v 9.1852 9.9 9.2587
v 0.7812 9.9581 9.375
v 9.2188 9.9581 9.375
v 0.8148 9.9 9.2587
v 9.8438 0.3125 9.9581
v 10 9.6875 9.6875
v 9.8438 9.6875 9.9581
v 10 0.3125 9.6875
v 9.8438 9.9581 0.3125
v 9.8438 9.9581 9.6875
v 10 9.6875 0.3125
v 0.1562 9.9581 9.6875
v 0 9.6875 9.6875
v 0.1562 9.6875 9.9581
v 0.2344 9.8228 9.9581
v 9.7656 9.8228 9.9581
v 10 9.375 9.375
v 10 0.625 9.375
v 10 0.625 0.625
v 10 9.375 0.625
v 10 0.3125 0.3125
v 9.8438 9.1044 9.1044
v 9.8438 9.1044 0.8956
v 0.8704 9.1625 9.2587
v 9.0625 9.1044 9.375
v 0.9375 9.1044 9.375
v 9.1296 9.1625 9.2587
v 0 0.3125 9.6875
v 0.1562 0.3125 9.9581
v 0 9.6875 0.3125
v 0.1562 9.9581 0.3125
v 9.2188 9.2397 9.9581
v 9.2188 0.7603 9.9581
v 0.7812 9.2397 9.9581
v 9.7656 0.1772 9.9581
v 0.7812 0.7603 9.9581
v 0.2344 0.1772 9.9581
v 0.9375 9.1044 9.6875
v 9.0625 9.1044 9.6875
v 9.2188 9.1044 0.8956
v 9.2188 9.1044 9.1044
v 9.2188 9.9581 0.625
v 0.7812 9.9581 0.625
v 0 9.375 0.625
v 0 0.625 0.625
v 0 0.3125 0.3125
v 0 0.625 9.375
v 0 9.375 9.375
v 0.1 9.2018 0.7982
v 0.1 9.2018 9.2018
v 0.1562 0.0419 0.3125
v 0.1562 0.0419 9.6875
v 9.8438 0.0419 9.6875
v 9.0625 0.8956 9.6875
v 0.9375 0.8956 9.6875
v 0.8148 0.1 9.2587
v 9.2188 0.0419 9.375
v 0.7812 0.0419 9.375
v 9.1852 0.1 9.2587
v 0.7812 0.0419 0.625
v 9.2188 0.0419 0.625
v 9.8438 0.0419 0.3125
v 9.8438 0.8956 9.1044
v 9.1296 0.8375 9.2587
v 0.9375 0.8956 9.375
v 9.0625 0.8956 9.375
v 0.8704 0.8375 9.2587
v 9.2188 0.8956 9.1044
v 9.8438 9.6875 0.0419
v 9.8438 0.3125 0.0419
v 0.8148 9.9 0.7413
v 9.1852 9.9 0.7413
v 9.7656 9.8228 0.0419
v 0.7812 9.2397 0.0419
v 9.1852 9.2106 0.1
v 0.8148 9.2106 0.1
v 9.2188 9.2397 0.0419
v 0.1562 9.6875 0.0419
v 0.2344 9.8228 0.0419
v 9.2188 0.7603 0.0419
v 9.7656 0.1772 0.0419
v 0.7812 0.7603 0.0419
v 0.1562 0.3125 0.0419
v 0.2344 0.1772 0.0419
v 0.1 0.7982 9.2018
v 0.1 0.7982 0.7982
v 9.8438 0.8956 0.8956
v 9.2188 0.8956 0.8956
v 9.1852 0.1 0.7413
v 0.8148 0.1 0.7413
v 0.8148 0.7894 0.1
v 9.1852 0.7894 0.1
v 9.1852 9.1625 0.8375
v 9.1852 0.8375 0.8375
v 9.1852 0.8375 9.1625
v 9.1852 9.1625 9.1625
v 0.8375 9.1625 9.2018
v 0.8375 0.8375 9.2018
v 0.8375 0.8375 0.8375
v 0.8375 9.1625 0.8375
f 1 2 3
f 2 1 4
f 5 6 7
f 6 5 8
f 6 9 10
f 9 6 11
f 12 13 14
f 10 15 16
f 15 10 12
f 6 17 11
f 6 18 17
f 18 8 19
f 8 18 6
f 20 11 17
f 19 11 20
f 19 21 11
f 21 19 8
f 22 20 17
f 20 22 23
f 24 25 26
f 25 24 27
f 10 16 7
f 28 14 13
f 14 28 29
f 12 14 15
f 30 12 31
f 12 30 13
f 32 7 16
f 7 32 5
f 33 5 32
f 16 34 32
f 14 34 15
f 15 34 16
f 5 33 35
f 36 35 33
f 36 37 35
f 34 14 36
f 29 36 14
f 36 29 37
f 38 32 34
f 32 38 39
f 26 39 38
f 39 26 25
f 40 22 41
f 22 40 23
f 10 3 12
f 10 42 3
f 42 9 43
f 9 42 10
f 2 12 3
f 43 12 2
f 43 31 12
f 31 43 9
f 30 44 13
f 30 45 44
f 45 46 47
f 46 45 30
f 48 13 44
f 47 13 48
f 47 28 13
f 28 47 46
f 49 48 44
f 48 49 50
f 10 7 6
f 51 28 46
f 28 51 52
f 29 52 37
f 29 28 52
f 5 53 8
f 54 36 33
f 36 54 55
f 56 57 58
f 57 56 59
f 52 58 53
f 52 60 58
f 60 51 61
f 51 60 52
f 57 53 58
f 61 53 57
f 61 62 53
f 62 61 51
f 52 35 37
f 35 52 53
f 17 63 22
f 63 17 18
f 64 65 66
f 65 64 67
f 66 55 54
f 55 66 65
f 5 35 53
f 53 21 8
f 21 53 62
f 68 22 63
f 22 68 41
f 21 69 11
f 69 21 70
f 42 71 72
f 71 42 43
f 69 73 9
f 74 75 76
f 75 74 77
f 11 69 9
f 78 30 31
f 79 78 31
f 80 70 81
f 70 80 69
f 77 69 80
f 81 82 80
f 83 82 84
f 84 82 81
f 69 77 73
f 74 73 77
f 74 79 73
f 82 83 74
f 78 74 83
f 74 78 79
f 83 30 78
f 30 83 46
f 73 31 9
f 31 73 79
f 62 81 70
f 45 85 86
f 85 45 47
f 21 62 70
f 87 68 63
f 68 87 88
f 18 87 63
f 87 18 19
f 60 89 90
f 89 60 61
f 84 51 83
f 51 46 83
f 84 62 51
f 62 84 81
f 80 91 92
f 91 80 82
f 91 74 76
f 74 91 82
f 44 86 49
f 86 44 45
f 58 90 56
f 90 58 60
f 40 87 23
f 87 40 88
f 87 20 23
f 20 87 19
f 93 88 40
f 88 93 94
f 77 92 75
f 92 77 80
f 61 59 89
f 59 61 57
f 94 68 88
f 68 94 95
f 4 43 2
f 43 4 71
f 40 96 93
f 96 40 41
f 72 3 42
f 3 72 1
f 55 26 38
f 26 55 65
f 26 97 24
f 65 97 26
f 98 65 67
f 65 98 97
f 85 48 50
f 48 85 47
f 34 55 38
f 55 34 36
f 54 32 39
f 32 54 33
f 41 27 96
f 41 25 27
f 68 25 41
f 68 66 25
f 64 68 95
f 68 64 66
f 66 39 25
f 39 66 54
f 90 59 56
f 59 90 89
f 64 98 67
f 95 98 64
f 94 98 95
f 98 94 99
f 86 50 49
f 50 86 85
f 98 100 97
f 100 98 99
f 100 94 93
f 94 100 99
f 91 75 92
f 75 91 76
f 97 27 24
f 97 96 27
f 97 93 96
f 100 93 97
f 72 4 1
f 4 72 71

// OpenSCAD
module box(side=10)  {
  $fn=50;
  radius = side * 1/6;
  translate([radius, radius, radius])
  minkowski()
  {
      cube([side, side, side], 0);
      sphere(radius);
  }
}

// box(10);


module frame(side=10, thickness=1)  {
  $fn=50;
  innerSize = side - thickness * 2;
  difference() {
    // outer cube
    cube([side, side, side]);

    // inner cut
    translate([thickness, thickness, thickness])
    union() {
      for (x = [-2:4:2]) {
        translate([x*thickness, 0, 0])
        cube([innerSize, innerSize, innerSize]);
      }
      for (y = [-2:4:2]) {
        translate([0, y*thickness, 0])
        cube([innerSize, innerSize, innerSize]);
      }
      for (z = [-2:4:2]) {
        translate([ 0, 0, z*thickness])
        cube([innerSize, innerSize, innerSize]);
      }
    };
  }
}

// Pair this with $fn to account for not a perfect radius

side = 10;
delta = side/50;
thickness = side * 1/32;
radius = side * 1/32;
width = radius*2 + thickness - delta;
dark = "#3a3a30";
//light = "#eaeae1";
// dark = "black";
light = "white";

module roundedFrame() {
  $fn=6;
  translate([radius,radius,radius])
  color(dark)
  minkowski()
  {
      frame(side - 2*radius, thickness);
      sphere(radius);
  }
}

module panel() {
  panelSide = side - 2*radius;
  cube([panelSide,panelSide, width]);
}


module notion() {
  roundedFrame();

  // left
  color(dark)
    rotate([90,0,0])
    translate([radius,radius,-width - delta/2])
    panel();

  // back
  color(light)
    rotate([0,-90,0])
    translate([radius,radius,-width - delta/2])
    panel();

  // top
  // color(light)
  //   translate([0,0,side])
  //   translate([radius,radius,-width - delta/2])
  //   panel();

  // top
  color(light)
    translate([0,0,0])
    translate([radius,radius,delta/2])
    panel();

  // right
  color(light)
    translate([0,side - delta/2,0])
    rotate([90,0,0])
    translate([radius,radius,0])
    panel();
}

notion();

color(dark)
translate([side*0.55,side*0.25,width])
scale(0.65)
rotate([90,0,90])
text("N", font="serif");


// Minkowski doesnt work on text!
// minkowski()
// {
//   text("N", font="serif");
//   translate([1,0,0]) sphere(0.5);
// }

// Maybe we can iterate this thing in a circle...
// module Embossed(step = 0.05, height = 1, grad = 0.5) {
//         for (z = [ 0 : step : height ]) {
//                 translate([0, 0, z])
//                 linear_extrude(height = step)
//                 offset(delta = -z * grad, chamfer = true)
//                 children();
//         }
// };
